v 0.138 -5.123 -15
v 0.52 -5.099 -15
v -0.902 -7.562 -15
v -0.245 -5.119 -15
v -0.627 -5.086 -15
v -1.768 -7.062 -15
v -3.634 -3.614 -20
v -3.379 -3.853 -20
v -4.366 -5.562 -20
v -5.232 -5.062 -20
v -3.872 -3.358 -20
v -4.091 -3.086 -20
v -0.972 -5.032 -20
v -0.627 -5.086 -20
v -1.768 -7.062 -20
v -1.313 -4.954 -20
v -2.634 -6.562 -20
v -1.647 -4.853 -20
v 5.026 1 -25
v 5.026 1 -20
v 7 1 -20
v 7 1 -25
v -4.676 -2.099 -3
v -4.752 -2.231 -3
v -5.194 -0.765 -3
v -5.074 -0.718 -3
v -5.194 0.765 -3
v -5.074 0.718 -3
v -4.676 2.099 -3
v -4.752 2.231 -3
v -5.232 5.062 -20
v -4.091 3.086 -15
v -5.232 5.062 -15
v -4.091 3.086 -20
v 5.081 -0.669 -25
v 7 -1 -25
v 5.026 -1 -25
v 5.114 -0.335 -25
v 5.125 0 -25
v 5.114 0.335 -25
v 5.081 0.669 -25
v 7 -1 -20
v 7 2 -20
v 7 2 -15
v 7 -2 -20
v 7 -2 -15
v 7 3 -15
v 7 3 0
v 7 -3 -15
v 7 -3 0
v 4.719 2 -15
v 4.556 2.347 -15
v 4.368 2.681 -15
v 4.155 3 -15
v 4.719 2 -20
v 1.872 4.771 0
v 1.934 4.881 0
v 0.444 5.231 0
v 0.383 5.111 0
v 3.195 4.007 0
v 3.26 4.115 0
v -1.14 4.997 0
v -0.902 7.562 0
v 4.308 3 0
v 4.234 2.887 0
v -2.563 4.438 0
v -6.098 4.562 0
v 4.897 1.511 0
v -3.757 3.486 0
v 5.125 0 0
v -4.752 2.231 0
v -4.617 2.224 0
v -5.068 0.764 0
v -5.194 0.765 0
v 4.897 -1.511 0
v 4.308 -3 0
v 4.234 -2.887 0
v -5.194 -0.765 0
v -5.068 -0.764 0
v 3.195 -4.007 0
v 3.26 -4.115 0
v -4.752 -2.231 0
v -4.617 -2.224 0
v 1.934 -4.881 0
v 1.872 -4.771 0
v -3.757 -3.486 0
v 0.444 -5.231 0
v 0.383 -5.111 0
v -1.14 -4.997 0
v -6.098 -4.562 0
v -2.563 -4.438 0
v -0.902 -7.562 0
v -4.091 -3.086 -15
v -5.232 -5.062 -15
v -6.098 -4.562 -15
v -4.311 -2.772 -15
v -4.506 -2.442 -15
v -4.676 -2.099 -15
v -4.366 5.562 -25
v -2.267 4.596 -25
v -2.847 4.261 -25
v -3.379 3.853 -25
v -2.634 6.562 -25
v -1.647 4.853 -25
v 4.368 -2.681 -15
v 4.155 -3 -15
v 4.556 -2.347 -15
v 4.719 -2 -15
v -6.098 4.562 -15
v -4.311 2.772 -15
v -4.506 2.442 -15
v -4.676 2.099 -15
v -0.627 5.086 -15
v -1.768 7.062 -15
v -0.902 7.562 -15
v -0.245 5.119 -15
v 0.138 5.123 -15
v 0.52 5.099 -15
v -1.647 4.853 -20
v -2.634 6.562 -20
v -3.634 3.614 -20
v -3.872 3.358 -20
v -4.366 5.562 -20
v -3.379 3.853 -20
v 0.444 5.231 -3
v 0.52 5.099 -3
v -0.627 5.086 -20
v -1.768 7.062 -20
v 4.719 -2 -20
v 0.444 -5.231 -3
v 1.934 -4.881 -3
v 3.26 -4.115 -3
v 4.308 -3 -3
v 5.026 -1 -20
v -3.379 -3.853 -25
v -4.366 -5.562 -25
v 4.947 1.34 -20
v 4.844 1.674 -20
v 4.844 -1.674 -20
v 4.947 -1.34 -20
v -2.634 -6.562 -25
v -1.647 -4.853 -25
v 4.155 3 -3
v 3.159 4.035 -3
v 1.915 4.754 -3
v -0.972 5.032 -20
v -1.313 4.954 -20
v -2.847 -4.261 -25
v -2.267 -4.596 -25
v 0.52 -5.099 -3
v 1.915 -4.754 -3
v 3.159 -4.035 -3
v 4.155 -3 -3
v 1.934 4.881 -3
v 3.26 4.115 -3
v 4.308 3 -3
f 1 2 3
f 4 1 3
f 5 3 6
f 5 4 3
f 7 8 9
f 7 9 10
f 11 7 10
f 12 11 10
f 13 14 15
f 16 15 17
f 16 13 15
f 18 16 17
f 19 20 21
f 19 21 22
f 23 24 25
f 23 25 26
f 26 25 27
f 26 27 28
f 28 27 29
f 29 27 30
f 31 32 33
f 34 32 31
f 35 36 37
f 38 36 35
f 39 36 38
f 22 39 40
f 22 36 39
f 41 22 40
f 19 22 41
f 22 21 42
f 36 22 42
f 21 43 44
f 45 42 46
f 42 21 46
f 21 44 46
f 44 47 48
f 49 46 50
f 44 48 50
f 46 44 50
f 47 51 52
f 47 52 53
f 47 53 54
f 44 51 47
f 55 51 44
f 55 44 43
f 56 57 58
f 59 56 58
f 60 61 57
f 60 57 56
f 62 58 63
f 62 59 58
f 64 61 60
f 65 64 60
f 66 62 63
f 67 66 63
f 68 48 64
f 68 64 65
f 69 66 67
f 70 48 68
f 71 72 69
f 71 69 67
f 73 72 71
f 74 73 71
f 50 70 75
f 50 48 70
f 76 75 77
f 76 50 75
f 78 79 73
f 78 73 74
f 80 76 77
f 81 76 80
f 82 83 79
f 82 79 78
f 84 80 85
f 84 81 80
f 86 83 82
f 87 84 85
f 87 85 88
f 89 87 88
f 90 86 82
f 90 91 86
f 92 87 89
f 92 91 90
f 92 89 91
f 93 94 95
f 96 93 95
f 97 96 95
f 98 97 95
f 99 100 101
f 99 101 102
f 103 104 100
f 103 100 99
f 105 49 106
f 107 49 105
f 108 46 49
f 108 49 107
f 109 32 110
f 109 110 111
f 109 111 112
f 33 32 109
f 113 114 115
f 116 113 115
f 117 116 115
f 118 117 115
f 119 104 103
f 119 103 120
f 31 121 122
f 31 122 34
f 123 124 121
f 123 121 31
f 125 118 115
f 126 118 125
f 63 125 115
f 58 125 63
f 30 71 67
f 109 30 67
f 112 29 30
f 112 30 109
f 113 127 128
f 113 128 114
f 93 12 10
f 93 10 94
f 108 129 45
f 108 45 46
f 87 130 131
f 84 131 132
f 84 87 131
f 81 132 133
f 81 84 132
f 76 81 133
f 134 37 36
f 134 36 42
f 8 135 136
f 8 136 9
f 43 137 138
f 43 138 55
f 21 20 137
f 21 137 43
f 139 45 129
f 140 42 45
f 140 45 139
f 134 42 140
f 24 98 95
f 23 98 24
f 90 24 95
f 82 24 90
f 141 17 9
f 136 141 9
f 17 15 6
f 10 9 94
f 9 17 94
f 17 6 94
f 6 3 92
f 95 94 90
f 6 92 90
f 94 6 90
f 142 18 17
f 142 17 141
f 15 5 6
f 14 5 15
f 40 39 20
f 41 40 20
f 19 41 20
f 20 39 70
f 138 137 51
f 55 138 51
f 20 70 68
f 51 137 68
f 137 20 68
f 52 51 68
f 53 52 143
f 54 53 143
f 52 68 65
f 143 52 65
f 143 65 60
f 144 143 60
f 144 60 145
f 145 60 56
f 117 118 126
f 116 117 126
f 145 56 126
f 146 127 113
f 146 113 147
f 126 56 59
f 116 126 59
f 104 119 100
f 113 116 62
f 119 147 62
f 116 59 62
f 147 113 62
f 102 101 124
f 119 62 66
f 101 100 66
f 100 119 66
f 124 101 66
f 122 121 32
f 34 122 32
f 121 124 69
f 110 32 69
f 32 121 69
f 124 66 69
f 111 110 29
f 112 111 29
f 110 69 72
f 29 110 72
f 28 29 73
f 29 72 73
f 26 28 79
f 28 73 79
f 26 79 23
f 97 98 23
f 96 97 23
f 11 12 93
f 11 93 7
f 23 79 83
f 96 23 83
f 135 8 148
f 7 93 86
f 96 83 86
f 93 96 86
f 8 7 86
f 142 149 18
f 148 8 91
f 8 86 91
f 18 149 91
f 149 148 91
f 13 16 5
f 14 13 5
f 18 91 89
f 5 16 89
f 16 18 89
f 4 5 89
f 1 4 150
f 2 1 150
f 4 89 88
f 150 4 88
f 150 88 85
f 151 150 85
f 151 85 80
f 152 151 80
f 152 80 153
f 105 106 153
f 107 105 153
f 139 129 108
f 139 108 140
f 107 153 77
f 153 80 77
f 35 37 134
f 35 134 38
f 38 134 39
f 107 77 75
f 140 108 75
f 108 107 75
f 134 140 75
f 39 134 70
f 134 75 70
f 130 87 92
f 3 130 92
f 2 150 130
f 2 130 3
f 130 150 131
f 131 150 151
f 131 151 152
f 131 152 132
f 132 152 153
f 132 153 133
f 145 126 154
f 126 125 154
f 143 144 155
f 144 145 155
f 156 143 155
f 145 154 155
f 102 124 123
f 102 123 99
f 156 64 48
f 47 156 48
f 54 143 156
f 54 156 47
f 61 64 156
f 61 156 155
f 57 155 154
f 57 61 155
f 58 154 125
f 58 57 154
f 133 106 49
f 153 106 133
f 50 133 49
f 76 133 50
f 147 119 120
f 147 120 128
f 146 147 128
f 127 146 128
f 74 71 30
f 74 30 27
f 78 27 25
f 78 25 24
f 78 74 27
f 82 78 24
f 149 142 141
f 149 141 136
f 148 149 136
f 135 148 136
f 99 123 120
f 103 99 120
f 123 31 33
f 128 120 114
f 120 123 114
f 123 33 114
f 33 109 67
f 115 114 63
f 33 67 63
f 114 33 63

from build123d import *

# Parameters (mm, degrees)
PAD002_DEPTH    = 7
PAD003_DEPTH    = 7
PAD004_DEPTH    = 7
SKETCH011_R     = 5.25
PAD005_DEPTH    = 3
SKETCH012_R     = 5.125
POCKET002_DEPTH = 25.001


with BuildPart() as part:
    # Sketch008 (on DatumPlane) → Pad002 (new body)
    with BuildSketch(Plane(origin=(0, 0, 0), x_dir=(-0.8660254038, -0.5, 0), z_dir=(-0.5, 0.8660254038, 0))):
        Polygon((-3, 0), (3, 0), (3, -15), (2, -15), (2, -20), (1, -20), (1, -25), (-1, -25), (-1, -20), (-2, -20), (-2, -15), (-3, -15), align=None)
    extrude(amount=PAD002_DEPTH)

    # Sketch009 (on DatumPlane) → Pad003 (join)
    with BuildSketch(Plane(origin=(0, 0, 0), x_dir=(0.8660254038, -0.5, 0), z_dir=(-0.5, -0.8660254038, 0))):
        Polygon((-3, 0), (3, 0), (3, -15), (2, -15), (2, -20), (1, -20), (1, -25), (-1, -25), (-1, -20), (-2, -20), (-2, -15), (-3, -15), align=None)
    extrude(amount=PAD003_DEPTH)

    # Sketch010 → Pad004 (join)
    with BuildSketch(Plane.YZ):
        Polygon((-3, 0), (3, 0), (3, -15), (2, -15), (2, -20), (1, -20), (1, -25), (-1, -25), (-1, -20), (-2, -20), (-2, -15), (-3, -15), align=None)
    extrude(amount=PAD004_DEPTH)

    # Sketch011 → Pad005 (join)
    with BuildSketch(Plane.XY):
        Circle(SKETCH011_R)
    extrude(amount=-PAD005_DEPTH)

    # Sketch012 → Pocket002 (cut, through all)
    with BuildSketch(Plane.XY):
        Circle(SKETCH012_R)
    extrude(amount=-POCKET002_DEPTH, mode=Mode.SUBTRACT)


solid = part.part
